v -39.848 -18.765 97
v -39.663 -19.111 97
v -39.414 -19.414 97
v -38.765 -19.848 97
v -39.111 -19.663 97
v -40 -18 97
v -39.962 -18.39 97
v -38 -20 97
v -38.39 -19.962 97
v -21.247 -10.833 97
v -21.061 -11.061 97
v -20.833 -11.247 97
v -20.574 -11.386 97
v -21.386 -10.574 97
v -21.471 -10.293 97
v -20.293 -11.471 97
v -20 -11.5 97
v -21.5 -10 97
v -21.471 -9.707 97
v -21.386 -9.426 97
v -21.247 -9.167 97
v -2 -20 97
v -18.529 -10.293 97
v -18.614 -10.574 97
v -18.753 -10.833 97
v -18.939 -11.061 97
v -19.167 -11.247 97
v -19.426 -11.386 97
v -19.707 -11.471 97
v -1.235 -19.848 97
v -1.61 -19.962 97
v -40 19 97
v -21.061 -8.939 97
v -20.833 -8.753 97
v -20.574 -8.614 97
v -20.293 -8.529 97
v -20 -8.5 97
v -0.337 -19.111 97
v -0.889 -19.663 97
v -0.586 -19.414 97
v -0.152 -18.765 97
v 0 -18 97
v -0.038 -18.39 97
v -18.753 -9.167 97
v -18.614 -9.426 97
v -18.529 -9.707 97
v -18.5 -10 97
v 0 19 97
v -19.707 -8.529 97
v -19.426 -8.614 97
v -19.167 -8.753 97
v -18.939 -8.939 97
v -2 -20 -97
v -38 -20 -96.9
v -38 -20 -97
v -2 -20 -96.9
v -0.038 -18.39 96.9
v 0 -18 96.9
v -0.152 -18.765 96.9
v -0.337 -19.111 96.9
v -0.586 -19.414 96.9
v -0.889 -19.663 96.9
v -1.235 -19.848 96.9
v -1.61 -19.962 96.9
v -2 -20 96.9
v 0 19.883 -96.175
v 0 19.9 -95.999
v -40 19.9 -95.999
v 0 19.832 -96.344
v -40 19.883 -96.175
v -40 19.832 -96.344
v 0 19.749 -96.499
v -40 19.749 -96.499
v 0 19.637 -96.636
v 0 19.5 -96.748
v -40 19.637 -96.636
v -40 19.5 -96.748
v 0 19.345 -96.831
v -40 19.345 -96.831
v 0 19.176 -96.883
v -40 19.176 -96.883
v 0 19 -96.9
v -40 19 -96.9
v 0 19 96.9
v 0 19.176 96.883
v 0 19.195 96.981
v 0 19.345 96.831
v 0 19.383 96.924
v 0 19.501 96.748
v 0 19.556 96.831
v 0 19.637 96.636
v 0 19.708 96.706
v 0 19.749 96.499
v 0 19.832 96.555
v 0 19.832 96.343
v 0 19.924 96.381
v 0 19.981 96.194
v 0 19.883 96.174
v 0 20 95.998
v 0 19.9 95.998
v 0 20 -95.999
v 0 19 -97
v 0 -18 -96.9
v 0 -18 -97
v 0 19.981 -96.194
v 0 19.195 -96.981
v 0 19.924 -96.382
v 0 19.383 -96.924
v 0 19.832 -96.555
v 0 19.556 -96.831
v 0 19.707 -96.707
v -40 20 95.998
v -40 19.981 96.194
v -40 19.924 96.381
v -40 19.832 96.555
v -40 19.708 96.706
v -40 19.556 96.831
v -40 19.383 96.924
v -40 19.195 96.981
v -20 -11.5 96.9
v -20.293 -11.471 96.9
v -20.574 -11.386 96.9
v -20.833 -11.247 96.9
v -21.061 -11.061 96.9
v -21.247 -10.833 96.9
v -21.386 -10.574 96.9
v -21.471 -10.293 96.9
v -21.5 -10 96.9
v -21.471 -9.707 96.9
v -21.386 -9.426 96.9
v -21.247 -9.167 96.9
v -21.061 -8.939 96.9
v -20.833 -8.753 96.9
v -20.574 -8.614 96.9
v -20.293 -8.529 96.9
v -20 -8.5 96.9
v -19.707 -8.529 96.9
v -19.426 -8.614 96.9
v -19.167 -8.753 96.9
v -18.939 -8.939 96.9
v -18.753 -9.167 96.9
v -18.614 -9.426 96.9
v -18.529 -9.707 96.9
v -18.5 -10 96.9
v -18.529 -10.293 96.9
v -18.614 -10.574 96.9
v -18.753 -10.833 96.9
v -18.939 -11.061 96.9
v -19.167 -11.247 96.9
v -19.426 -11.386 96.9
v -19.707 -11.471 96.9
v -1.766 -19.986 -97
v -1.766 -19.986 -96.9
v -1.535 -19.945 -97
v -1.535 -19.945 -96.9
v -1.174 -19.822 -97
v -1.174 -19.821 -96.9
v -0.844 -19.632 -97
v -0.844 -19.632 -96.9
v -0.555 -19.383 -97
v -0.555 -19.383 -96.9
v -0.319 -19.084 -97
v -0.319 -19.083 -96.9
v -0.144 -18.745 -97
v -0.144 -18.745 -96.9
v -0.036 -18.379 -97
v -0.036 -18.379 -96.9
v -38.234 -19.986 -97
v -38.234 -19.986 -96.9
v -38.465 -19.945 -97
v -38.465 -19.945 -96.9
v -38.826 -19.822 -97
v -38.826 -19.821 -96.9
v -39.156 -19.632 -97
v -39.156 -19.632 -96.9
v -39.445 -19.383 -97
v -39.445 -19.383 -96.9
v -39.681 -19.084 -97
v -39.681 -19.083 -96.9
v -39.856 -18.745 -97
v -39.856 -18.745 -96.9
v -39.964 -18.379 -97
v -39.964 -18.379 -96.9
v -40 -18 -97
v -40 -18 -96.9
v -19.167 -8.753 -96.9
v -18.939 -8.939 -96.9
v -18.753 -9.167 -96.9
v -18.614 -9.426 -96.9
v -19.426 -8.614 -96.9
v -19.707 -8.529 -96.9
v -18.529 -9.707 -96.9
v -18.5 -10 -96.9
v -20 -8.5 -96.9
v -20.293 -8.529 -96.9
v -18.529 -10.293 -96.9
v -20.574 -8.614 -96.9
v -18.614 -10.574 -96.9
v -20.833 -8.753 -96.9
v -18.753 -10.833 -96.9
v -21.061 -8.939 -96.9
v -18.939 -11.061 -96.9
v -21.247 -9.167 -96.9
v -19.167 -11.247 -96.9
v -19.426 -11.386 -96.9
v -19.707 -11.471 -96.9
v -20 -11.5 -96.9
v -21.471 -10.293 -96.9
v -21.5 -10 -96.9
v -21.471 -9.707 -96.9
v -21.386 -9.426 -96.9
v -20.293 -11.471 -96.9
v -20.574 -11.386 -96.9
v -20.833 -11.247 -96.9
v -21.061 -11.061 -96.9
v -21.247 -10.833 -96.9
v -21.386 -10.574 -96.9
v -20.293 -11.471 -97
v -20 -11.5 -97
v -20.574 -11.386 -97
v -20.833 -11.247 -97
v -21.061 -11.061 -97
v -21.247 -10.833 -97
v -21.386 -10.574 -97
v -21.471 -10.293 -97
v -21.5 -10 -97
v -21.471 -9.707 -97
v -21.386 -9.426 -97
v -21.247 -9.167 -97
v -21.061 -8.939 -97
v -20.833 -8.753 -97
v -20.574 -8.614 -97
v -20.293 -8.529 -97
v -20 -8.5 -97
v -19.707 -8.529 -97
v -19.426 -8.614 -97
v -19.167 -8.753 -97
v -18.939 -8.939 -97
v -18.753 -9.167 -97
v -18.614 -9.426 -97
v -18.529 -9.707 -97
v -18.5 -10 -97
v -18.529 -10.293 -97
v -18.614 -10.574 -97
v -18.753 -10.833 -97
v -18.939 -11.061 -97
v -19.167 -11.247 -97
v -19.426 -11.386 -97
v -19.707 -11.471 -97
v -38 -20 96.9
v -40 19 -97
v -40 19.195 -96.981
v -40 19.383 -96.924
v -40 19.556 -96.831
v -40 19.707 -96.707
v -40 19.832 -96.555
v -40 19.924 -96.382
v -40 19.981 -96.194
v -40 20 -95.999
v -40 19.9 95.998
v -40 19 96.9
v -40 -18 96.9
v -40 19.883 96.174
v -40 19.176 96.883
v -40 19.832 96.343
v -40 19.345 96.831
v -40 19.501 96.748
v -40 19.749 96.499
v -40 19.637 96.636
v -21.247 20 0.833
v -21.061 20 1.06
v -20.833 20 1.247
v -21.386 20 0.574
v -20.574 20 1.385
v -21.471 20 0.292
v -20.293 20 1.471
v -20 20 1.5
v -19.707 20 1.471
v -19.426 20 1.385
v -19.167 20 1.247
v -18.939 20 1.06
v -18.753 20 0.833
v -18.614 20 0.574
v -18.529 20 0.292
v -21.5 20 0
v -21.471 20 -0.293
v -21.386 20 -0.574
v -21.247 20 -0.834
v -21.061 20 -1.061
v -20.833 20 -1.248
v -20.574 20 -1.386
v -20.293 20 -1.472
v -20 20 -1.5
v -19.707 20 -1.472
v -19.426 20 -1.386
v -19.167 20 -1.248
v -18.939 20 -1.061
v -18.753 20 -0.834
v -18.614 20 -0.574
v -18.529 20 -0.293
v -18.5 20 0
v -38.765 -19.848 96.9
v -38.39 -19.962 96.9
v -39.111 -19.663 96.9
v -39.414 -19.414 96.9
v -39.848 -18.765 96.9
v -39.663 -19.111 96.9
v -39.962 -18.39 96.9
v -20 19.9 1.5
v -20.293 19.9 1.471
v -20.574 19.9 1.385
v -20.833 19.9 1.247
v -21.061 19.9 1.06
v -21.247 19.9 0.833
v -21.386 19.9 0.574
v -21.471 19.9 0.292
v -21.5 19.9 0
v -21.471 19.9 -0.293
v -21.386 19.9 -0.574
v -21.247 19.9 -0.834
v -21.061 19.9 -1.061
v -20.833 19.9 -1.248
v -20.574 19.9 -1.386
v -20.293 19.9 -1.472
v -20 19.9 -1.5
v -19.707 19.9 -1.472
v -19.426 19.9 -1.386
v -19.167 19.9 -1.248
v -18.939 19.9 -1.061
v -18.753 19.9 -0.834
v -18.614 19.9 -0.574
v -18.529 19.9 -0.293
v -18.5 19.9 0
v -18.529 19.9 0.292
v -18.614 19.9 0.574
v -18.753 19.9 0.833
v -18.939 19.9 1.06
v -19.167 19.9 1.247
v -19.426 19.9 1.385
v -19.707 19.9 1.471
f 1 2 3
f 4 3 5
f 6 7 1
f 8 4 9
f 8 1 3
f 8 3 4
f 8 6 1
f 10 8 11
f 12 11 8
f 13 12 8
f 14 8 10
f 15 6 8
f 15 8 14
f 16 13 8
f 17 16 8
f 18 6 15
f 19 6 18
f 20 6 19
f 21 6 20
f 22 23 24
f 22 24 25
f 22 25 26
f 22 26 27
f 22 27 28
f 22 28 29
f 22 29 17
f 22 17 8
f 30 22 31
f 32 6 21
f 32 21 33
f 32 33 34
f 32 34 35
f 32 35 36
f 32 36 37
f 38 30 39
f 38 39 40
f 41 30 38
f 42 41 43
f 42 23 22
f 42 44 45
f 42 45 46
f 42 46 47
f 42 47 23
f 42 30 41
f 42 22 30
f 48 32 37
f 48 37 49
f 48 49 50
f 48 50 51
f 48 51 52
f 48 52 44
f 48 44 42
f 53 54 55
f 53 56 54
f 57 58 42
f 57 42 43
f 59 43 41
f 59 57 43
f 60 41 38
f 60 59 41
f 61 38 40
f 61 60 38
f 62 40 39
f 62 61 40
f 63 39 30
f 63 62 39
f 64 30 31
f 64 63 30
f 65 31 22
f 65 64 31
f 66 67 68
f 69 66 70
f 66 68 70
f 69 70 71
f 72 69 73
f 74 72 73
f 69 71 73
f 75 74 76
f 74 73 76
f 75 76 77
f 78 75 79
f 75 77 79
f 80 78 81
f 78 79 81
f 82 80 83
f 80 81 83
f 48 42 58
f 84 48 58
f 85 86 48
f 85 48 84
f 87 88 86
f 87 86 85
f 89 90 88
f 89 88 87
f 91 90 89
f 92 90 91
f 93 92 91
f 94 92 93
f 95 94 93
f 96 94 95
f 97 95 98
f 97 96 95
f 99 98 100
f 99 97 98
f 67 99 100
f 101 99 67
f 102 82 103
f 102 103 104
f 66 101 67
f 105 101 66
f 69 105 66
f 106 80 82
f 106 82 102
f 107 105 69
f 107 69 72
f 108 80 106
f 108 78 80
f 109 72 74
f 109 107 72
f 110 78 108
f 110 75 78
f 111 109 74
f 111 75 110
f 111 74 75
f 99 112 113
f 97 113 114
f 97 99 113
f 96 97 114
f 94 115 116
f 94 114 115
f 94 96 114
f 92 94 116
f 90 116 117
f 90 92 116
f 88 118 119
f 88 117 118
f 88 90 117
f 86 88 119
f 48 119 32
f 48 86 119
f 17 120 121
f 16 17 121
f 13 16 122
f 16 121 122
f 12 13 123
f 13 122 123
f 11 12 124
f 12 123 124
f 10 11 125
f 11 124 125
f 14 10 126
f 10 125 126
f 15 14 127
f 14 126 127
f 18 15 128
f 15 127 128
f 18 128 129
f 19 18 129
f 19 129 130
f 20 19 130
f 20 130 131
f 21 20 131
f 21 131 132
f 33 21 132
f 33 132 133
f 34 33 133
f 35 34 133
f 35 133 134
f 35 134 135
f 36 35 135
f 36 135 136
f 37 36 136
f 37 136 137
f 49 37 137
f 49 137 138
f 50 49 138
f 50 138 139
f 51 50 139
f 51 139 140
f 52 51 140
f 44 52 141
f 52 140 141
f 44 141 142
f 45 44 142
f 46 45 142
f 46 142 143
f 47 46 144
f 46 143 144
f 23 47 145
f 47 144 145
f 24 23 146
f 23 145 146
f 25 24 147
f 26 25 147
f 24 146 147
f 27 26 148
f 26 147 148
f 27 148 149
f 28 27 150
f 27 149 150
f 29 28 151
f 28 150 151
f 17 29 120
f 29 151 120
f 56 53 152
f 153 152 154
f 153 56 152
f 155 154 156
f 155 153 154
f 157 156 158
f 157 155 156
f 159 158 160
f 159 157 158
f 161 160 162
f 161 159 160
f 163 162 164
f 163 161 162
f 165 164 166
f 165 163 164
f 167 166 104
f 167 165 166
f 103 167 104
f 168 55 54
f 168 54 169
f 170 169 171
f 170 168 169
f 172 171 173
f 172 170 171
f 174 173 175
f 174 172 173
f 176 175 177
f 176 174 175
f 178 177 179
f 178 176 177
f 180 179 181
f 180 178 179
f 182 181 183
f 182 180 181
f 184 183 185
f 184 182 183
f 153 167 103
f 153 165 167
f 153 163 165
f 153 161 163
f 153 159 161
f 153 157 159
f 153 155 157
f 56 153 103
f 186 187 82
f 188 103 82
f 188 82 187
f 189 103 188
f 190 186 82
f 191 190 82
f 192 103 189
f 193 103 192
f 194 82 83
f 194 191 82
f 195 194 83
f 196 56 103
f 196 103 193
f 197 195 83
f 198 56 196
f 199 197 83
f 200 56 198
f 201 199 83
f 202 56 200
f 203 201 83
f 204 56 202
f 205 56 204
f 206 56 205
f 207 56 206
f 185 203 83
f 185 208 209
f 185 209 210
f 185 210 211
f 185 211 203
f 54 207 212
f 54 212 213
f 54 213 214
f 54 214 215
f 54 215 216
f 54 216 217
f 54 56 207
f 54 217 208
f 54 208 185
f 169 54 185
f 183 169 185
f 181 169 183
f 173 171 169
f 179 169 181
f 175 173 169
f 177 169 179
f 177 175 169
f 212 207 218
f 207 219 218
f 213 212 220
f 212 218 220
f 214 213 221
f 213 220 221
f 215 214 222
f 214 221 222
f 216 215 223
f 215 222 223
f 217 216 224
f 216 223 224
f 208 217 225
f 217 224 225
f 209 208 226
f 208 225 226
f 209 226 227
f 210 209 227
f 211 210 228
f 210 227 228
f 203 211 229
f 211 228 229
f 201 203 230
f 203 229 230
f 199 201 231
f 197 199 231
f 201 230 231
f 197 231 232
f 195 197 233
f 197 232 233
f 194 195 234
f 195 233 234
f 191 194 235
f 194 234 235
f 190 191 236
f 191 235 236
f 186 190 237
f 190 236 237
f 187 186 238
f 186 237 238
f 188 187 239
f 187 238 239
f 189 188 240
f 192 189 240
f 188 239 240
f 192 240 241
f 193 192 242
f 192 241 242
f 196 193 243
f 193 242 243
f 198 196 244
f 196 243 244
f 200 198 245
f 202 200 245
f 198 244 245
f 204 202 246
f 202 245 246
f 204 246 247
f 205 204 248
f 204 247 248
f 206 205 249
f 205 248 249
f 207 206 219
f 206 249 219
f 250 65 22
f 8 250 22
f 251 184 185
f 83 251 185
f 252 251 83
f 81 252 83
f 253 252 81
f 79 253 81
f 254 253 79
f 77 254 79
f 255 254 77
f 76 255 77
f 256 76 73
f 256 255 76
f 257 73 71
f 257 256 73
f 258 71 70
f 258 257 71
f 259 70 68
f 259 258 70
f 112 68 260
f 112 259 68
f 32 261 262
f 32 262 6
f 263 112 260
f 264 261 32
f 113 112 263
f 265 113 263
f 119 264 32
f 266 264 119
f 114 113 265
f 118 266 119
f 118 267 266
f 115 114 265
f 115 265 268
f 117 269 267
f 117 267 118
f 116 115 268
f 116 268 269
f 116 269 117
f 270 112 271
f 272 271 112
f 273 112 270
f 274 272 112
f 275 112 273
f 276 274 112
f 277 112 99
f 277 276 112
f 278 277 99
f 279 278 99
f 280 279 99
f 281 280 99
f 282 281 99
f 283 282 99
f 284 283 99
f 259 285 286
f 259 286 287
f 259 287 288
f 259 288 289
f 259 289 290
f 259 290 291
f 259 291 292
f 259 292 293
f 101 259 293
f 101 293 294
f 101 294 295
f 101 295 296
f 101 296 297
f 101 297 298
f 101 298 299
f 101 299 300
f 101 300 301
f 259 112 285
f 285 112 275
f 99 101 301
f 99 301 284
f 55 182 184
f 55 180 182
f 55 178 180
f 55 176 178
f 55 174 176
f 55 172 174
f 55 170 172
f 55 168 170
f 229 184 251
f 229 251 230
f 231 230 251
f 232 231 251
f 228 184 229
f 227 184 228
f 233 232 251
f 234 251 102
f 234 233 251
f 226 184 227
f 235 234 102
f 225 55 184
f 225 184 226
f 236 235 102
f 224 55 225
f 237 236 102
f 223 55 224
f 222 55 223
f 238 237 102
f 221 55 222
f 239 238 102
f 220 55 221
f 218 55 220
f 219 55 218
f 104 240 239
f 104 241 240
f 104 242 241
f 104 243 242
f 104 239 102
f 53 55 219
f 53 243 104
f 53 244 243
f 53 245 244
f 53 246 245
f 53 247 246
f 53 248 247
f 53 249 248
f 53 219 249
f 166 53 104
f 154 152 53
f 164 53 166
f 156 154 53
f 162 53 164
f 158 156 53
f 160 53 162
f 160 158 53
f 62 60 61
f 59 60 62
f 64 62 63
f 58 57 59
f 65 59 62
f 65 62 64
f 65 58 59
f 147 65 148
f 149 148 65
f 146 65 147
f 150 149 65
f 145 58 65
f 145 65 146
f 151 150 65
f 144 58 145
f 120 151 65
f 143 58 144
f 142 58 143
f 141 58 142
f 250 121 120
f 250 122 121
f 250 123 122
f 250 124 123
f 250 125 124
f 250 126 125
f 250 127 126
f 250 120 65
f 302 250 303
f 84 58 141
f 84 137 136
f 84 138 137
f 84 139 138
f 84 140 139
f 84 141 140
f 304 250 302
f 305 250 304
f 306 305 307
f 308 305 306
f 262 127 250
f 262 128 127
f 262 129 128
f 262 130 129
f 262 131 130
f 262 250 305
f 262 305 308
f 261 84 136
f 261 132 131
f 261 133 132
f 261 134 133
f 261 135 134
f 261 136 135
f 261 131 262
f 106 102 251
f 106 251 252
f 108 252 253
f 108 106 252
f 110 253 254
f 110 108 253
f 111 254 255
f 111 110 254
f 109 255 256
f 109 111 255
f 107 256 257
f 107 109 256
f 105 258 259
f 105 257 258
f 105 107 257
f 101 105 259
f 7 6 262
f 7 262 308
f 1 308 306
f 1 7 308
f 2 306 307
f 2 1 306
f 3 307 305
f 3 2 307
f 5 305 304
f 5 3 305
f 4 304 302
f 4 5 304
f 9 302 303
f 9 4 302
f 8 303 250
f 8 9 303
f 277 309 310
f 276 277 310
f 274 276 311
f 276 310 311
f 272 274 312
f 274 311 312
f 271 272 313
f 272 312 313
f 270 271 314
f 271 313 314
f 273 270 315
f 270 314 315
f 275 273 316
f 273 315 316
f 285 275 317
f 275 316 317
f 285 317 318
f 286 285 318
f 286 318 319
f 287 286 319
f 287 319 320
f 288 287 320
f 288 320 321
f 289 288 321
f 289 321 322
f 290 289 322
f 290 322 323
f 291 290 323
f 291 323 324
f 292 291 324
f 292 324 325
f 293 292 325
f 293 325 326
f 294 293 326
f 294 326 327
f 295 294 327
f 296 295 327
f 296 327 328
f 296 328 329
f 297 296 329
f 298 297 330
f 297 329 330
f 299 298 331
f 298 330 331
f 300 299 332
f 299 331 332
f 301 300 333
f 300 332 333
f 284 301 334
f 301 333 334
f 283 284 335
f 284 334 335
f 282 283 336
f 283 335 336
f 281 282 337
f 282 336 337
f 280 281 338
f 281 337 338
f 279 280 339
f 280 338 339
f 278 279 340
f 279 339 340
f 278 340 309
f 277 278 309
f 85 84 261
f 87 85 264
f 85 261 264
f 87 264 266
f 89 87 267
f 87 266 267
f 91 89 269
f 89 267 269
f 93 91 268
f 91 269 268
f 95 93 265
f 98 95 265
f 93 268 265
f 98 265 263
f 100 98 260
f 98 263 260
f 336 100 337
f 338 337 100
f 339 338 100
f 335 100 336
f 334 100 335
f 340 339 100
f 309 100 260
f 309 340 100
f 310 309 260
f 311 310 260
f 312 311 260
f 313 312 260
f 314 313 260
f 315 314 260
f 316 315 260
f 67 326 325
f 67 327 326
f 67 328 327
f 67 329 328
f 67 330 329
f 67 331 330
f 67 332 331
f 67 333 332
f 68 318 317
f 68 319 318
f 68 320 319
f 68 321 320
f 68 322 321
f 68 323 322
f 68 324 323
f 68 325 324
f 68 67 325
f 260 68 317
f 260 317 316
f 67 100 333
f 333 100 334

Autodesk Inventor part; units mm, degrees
ref_plane "YZ Plane" through (0, 0, 0) normal (1, 0, 0) x (0, 1, 0)
ref_plane "XY Plane" through (0, 0, 0) normal (0, 0, 1) x (1, 0, 0)
sketch "Sketch1" plane through (0, 0, 0) normal (1, 0, 0) x (0, 1, 0)
  line L0 (20, 97) -> (-20, 97) construction
  line L1 (-20, 97) -> (-20, -97) construction
  line L2 (-20, -97) -> (20, -97) construction
  line L3 (20, -97) -> (20, 97) construction
  line L4 (20, 97) -> (-20, -97) construction
  line L5 (-20, 97) -> (20, -97) construction
  line L6 (-20, 97) -> (19, 97)
  line L7 (-20, -97) -> (19, -97)
  arc A0 (20, 95.9982) -> (19, 97) centre (19, 96) ccw
  arc A1 (19, -97) -> (20, -95.9993) centre (19, -96) ccw
  line L8 (20, 95.9982) -> (20, -95.9993)
  point P0 (0, 0)
  dimension "d0" = 40
  dimension "d1" = 194
  dimension "d2" = 39
  dimension "d3" = 39
ref_plane "Work Plane1" through (0, -20, 97) normal (0, 1, 0) x (-1, 0, 0)
sketch "Sketch2" plane through (0, -20, 97) normal (0, 1, 0) x (-1, 0, 0)
  line L0 (0, 0) -> (40, 0)
  line L1 (40, 0) -> (40, -0.1)
  line L2 (40, -0.1) -> (0, -0.1)
  line L3 (0, -0.1) -> (0, 0)
  point P0 (0, -97)
  dimension "d4" = 40
  dimension "d5" = 0.1
sweep "Sweep1" add profiles "Sketch2" path "Sketch1"
sketch "Sketch3" plane through (-40, 20, 95.9982) normal (0, 1, 0) x (1, 0, 0)
  line L0 (0, -0.0002) -> (0, 191.9975) construction
  line L1 (40, 0) -> (40, -1.0018) construction
  line L2 (0, 191.9975) -> (40, 0) construction
  line L3 (40, -0.0002) -> (40, 191.9975) construction
  line L4 (40, 191.9975) -> (0, -0.0002) construction
  point P0 (40, 95.9982)
  point P1 (20, 95.9987)
hole "Hole1" at (-20, 20, -0.0004) direction (0, -1, 0) diameter 3 end through all
fillet "Fillet1" radius 2 4 edges at (0, -20, 96.95) (0, -19.9999, -96.95) (-40, -20, 96.95) (-40, -19.9999, -96.95)
sketch "Sketch4" plane through (-40, 19, 97) normal (0, 0, 1) x (1, 0, 0)
  line L0 (0, -37) -> (0, 0) projected
  line L1 (38, -39) -> (2, -39) projected
  point P0 (40, -19)
  point P1 (20, -29)
  dimension "d16" = 20
  dimension "d17" = 10
hole "Hole2" at (-20, -10, 97) direction (0, 0, -1) diameter 3 end through all
equation "\"d3\" = d2"
properties material "Iron, Malleable"
